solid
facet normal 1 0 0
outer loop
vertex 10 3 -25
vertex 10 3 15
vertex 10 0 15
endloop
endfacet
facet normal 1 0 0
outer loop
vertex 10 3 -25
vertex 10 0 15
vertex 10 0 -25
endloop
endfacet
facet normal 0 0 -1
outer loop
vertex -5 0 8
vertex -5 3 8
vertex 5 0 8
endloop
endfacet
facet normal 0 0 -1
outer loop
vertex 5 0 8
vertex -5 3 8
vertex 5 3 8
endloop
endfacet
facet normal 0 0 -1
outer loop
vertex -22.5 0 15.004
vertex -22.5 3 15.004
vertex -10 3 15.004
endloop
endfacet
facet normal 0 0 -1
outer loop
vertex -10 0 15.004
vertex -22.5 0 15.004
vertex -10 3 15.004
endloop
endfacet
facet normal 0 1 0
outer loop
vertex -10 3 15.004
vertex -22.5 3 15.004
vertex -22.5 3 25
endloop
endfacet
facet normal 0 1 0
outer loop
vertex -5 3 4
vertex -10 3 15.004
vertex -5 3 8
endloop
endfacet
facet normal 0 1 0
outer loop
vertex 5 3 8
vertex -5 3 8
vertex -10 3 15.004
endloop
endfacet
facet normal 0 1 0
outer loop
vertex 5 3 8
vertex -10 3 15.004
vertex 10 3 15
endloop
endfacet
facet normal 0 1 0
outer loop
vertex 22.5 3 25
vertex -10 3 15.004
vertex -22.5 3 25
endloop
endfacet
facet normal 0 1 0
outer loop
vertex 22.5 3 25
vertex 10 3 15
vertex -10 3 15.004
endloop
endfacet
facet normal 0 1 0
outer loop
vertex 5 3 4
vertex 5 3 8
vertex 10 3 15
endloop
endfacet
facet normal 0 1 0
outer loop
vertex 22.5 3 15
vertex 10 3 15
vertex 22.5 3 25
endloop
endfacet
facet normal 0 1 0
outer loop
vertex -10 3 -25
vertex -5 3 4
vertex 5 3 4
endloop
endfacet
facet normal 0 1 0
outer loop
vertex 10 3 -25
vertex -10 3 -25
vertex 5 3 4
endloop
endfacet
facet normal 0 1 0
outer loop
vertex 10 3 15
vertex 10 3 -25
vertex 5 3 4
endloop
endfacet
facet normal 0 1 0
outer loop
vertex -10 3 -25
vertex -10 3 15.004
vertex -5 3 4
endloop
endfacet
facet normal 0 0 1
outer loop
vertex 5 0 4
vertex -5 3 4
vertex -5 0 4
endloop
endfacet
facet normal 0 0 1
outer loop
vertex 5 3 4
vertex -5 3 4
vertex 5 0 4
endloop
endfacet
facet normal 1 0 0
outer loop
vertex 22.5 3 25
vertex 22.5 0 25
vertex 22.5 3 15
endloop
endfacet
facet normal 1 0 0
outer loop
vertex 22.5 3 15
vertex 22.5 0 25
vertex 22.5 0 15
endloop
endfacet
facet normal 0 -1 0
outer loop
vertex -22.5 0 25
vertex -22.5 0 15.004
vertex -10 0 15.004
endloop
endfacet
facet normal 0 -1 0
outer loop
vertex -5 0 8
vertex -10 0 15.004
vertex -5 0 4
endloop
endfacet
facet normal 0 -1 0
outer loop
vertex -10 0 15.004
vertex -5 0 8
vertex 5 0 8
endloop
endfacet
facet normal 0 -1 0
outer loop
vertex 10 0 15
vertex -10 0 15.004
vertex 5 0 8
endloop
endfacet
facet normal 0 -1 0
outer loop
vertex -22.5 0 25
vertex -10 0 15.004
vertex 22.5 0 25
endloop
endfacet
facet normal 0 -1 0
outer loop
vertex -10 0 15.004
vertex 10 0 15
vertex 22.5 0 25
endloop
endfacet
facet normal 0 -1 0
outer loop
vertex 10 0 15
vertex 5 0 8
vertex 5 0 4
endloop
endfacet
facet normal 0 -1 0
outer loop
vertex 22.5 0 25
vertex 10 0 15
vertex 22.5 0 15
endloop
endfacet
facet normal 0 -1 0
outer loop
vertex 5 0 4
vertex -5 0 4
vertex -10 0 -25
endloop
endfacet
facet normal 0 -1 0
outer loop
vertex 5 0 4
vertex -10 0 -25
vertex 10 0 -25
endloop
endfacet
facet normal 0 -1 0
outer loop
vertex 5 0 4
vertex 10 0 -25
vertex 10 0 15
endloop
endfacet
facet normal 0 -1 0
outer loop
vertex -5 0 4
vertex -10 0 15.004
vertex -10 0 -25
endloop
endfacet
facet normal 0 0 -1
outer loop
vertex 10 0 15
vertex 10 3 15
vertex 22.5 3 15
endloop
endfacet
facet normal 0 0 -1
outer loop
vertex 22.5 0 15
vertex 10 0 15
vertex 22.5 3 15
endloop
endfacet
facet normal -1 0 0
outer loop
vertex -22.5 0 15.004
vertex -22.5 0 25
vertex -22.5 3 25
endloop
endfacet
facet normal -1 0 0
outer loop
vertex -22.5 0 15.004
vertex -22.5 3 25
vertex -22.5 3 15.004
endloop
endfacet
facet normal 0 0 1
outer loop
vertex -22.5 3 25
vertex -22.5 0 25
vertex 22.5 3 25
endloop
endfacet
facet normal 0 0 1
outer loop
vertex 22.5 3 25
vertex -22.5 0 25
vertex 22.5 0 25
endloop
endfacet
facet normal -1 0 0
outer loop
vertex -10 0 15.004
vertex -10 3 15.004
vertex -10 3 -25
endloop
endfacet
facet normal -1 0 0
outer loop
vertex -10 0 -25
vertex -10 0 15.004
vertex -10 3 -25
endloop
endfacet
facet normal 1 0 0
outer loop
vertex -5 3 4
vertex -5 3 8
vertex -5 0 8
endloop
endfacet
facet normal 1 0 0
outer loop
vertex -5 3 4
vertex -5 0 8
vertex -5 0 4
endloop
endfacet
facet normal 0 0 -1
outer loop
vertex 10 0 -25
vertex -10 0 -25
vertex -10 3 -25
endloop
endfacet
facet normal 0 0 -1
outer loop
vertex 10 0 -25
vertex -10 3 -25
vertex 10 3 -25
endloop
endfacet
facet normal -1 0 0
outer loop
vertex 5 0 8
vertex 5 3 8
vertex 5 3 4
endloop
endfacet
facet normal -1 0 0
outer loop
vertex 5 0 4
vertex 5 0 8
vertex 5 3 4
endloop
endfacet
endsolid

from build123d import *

# Parameters (mm, degrees)
SKETCH1_W           = 45
SKETCH1_H           = 50
BOSS_EXTRUDE1_DEPTH = 3
SKETCH4_W           = 12.5
SKETCH4_H           = 40.003655499
SKETCH4_H_2         = 40
SKETCH4_W_2         = 10
SKETCH4_H_3         = 4
CUT_EXTRUDE1_DEPTH  = 3


with BuildPart() as part:
    # Sketch1 → Boss-Extrude1 (new body)
    with BuildSketch(Plane(origin=(0, 0, 0), x_dir=(1, 0, 0), z_dir=(0, 1, 0))):
        Rectangle(SKETCH1_W, SKETCH1_H)
    extrude(amount=BOSS_EXTRUDE1_DEPTH)

    # Sketch4 → Cut-Extrude1 (cut)
    with BuildSketch(Plane(origin=(0, 3, 0), x_dir=(1, 0, 0), z_dir=(0, 1, 0))):
        with Locations((-16.25, 4.99817225)):
            Rectangle(SKETCH4_W, SKETCH4_H)
        with Locations((16.25, 5)):
            Rectangle(SKETCH4_W, SKETCH4_H_2)
        with Locations((0, -6)):
            Rectangle(SKETCH4_W_2, SKETCH4_H_3)
    extrude(amount=-CUT_EXTRUDE1_DEPTH, mode=Mode.SUBTRACT)


solid = part.part
